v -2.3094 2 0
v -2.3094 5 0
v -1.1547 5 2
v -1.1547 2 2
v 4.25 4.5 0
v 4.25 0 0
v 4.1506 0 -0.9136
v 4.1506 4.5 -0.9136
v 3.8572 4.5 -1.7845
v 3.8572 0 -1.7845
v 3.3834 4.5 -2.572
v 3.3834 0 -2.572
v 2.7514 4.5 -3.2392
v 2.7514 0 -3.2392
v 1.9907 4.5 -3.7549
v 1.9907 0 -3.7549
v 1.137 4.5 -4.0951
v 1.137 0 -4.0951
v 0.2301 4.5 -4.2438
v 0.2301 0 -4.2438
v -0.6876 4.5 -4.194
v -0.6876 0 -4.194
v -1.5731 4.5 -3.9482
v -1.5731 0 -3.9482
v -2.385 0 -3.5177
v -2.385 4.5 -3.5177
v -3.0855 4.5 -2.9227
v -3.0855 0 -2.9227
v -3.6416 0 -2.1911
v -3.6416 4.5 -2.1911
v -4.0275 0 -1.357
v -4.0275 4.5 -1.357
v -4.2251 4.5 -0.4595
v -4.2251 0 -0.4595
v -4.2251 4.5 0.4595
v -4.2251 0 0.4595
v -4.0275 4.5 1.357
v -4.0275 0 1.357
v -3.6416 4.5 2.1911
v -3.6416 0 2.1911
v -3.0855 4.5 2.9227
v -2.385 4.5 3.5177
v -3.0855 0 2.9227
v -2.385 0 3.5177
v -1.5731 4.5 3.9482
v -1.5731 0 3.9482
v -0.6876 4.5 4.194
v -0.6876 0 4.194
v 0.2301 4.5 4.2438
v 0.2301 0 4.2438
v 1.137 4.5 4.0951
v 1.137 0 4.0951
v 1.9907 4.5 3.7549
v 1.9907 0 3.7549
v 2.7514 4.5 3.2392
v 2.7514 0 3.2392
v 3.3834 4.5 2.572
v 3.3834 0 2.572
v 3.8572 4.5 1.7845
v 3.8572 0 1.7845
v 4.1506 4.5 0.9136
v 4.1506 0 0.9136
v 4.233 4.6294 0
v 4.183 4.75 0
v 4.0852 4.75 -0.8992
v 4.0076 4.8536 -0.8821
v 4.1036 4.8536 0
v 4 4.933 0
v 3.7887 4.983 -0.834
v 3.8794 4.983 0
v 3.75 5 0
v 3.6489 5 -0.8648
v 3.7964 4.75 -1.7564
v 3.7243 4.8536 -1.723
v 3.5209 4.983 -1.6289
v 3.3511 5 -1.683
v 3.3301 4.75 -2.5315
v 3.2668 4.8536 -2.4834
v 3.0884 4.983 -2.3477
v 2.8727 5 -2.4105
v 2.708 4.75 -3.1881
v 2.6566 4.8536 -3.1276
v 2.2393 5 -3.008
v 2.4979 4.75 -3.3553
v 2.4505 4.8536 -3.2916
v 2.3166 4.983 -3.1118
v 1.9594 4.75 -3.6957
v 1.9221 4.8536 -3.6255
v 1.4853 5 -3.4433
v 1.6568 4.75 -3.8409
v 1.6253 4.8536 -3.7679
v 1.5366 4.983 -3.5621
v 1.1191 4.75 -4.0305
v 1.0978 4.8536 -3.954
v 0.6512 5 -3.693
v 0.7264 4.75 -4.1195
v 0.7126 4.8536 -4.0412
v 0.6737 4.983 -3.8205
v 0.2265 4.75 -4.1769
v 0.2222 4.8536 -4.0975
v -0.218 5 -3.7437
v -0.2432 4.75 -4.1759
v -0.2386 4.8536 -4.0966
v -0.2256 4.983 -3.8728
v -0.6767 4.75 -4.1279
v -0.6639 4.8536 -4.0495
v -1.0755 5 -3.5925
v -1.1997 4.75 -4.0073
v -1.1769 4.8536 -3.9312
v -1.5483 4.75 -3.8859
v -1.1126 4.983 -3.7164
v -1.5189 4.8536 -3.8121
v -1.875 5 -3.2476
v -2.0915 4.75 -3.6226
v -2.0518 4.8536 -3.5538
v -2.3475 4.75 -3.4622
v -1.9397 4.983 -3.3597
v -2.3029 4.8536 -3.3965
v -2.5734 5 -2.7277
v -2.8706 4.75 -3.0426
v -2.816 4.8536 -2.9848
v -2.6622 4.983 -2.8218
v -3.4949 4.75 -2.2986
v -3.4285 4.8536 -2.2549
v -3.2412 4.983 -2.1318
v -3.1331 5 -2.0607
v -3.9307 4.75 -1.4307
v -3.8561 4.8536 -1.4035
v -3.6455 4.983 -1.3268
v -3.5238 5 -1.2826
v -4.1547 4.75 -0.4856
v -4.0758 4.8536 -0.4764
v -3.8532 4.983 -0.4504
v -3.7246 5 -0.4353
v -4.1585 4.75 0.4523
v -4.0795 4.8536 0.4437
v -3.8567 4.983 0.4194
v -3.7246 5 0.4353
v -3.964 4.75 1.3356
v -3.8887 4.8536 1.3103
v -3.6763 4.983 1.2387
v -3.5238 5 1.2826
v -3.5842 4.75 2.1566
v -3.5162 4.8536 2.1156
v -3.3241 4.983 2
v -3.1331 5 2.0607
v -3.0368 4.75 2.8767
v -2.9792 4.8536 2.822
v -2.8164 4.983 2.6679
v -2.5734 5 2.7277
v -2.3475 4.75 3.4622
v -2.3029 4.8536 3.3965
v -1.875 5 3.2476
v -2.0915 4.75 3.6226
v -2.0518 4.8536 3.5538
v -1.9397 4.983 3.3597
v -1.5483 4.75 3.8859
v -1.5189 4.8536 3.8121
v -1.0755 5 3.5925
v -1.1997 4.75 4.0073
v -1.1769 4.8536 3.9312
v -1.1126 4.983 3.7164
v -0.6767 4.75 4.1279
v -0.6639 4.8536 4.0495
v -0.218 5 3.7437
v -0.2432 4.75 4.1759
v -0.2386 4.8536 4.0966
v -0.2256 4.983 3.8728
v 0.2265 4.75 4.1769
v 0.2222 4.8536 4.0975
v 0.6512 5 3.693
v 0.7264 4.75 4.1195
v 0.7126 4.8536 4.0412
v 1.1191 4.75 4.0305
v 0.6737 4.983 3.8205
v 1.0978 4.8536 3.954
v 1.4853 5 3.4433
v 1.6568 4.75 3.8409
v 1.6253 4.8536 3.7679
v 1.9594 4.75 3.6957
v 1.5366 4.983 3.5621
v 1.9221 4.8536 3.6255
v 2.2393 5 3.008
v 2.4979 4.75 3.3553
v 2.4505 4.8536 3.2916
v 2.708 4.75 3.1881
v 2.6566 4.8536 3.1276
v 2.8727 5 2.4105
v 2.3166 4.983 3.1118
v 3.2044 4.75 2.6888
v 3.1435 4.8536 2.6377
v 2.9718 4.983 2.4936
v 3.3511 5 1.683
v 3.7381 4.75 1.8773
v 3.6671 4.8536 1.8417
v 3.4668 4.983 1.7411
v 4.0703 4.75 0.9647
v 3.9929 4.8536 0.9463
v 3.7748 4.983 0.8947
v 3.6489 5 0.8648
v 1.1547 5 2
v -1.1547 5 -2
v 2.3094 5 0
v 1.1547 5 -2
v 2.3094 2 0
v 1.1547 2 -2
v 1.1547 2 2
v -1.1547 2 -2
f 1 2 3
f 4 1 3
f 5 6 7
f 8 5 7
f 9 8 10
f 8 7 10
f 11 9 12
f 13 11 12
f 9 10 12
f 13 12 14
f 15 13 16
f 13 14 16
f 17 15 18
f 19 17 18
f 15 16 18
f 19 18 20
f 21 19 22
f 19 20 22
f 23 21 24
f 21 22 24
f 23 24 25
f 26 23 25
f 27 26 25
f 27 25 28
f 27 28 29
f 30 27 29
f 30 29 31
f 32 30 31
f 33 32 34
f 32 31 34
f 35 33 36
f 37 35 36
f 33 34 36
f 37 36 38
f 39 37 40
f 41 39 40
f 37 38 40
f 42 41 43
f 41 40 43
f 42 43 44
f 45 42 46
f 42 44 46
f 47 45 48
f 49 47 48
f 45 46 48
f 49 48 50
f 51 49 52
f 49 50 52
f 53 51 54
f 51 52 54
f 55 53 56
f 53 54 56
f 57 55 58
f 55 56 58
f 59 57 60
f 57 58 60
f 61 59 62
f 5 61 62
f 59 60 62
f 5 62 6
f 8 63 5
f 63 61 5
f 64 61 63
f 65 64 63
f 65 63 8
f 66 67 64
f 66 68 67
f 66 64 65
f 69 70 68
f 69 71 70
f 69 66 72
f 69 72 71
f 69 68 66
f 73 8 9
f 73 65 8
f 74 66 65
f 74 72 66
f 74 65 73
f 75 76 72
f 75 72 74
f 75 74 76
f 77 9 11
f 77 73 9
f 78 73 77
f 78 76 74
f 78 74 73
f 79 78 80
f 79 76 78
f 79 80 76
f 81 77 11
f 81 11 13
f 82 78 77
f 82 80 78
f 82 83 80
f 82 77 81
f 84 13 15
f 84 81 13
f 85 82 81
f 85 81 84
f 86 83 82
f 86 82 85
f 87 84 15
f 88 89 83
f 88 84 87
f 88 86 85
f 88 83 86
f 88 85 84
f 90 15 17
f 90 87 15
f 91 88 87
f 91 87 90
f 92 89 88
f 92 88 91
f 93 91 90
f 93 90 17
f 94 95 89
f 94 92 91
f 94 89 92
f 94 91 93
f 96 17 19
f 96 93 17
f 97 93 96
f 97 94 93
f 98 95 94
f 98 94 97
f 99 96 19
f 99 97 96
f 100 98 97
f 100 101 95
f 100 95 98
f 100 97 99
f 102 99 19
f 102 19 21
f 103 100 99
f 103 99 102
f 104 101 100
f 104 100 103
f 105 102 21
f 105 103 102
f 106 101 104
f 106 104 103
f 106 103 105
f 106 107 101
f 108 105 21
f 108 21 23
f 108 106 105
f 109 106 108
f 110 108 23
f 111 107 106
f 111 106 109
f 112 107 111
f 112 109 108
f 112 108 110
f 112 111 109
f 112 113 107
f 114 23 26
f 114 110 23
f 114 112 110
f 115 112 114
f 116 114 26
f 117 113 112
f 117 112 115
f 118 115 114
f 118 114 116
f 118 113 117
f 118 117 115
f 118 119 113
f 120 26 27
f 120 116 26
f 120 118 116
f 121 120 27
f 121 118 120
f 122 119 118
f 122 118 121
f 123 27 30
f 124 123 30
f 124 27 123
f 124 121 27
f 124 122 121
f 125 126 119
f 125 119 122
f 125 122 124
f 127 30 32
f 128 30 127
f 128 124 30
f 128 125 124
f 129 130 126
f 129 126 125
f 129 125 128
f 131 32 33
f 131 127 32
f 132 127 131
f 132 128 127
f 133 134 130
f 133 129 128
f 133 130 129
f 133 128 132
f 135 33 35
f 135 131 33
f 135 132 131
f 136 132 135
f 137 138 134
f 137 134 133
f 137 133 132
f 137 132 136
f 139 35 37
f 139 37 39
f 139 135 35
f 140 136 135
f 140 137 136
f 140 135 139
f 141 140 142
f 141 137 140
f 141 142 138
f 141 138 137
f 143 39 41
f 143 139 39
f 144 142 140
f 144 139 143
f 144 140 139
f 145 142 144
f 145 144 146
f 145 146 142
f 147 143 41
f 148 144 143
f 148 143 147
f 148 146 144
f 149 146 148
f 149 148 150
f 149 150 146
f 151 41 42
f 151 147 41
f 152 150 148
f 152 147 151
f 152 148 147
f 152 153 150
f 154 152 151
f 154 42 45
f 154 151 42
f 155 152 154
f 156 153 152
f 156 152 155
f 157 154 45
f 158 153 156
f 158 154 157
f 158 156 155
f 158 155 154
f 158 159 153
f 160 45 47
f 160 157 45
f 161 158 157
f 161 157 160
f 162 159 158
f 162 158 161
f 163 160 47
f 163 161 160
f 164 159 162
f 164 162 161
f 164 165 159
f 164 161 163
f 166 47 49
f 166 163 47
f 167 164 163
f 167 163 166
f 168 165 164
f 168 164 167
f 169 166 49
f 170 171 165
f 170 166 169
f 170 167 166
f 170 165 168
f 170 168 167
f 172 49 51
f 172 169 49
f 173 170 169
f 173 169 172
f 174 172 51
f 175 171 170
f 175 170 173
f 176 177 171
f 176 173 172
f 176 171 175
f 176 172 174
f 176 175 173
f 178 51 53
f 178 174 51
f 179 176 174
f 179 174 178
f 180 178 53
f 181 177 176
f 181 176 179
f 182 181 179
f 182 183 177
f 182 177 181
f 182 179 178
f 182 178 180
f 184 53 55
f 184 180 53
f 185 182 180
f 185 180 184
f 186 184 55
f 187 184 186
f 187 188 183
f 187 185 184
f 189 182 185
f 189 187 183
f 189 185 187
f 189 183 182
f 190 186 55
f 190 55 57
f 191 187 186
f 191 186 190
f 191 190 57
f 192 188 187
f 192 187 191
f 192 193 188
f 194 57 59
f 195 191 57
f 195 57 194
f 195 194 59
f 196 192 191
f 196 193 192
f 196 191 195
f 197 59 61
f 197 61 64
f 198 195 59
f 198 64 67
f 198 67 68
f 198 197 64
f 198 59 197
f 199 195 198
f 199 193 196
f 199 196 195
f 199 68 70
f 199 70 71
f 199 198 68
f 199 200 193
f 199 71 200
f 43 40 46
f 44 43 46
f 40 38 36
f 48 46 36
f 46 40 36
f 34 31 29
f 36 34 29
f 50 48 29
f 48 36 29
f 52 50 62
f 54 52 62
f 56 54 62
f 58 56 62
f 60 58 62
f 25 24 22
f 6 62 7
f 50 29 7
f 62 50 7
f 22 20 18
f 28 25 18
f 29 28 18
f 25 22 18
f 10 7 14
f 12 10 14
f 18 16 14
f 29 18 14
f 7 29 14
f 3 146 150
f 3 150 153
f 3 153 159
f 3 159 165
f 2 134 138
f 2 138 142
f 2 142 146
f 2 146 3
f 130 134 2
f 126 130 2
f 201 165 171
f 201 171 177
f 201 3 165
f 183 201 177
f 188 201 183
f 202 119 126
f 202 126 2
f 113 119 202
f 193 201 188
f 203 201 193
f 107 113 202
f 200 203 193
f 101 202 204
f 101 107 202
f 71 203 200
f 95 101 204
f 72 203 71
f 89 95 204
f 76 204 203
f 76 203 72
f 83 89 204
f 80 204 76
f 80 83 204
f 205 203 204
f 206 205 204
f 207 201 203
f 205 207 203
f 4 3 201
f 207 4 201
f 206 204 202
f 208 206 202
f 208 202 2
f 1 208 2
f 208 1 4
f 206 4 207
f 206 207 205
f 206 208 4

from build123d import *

# Parameters (mm, degrees)
SKETCH1_R           = 4.25
BOSS_EXTRUDE1_DEPTH = 5
CUT_EXTRUDE1_DEPTH  = 3
FILLET1_R           = 0.5


with BuildPart() as part:
    # Sketch1 → Boss-Extrude1 (new body)
    with BuildSketch(Plane(origin=(0, 0, 0), x_dir=(1, 0, 0), z_dir=(0, 1, 0))):
        Circle(SKETCH1_R)
    extrude(amount=BOSS_EXTRUDE1_DEPTH)

    # Sketch2 → Cut-Extrude1 (cut)
    with BuildSketch(Plane(origin=(0, 5, 0), x_dir=(1, 0, 0), z_dir=(0, 1, 0))):
        Polygon((-2.309401077, 0), (-1.154700538, -2), (1.154700538, -2), (2.309401077, 0), (1.154700538, 2), (-1.154700538, 2), align=None)
    extrude(amount=-CUT_EXTRUDE1_DEPTH, mode=Mode.SUBTRACT)

    # Fillet1
    fillet1_edges = [part.edges().sort_by_distance(p)[0] for p in [
        (-4.25, 5, 0),
    ]]
    fillet(fillet1_edges, radius=FILLET1_R)


solid = part.part
